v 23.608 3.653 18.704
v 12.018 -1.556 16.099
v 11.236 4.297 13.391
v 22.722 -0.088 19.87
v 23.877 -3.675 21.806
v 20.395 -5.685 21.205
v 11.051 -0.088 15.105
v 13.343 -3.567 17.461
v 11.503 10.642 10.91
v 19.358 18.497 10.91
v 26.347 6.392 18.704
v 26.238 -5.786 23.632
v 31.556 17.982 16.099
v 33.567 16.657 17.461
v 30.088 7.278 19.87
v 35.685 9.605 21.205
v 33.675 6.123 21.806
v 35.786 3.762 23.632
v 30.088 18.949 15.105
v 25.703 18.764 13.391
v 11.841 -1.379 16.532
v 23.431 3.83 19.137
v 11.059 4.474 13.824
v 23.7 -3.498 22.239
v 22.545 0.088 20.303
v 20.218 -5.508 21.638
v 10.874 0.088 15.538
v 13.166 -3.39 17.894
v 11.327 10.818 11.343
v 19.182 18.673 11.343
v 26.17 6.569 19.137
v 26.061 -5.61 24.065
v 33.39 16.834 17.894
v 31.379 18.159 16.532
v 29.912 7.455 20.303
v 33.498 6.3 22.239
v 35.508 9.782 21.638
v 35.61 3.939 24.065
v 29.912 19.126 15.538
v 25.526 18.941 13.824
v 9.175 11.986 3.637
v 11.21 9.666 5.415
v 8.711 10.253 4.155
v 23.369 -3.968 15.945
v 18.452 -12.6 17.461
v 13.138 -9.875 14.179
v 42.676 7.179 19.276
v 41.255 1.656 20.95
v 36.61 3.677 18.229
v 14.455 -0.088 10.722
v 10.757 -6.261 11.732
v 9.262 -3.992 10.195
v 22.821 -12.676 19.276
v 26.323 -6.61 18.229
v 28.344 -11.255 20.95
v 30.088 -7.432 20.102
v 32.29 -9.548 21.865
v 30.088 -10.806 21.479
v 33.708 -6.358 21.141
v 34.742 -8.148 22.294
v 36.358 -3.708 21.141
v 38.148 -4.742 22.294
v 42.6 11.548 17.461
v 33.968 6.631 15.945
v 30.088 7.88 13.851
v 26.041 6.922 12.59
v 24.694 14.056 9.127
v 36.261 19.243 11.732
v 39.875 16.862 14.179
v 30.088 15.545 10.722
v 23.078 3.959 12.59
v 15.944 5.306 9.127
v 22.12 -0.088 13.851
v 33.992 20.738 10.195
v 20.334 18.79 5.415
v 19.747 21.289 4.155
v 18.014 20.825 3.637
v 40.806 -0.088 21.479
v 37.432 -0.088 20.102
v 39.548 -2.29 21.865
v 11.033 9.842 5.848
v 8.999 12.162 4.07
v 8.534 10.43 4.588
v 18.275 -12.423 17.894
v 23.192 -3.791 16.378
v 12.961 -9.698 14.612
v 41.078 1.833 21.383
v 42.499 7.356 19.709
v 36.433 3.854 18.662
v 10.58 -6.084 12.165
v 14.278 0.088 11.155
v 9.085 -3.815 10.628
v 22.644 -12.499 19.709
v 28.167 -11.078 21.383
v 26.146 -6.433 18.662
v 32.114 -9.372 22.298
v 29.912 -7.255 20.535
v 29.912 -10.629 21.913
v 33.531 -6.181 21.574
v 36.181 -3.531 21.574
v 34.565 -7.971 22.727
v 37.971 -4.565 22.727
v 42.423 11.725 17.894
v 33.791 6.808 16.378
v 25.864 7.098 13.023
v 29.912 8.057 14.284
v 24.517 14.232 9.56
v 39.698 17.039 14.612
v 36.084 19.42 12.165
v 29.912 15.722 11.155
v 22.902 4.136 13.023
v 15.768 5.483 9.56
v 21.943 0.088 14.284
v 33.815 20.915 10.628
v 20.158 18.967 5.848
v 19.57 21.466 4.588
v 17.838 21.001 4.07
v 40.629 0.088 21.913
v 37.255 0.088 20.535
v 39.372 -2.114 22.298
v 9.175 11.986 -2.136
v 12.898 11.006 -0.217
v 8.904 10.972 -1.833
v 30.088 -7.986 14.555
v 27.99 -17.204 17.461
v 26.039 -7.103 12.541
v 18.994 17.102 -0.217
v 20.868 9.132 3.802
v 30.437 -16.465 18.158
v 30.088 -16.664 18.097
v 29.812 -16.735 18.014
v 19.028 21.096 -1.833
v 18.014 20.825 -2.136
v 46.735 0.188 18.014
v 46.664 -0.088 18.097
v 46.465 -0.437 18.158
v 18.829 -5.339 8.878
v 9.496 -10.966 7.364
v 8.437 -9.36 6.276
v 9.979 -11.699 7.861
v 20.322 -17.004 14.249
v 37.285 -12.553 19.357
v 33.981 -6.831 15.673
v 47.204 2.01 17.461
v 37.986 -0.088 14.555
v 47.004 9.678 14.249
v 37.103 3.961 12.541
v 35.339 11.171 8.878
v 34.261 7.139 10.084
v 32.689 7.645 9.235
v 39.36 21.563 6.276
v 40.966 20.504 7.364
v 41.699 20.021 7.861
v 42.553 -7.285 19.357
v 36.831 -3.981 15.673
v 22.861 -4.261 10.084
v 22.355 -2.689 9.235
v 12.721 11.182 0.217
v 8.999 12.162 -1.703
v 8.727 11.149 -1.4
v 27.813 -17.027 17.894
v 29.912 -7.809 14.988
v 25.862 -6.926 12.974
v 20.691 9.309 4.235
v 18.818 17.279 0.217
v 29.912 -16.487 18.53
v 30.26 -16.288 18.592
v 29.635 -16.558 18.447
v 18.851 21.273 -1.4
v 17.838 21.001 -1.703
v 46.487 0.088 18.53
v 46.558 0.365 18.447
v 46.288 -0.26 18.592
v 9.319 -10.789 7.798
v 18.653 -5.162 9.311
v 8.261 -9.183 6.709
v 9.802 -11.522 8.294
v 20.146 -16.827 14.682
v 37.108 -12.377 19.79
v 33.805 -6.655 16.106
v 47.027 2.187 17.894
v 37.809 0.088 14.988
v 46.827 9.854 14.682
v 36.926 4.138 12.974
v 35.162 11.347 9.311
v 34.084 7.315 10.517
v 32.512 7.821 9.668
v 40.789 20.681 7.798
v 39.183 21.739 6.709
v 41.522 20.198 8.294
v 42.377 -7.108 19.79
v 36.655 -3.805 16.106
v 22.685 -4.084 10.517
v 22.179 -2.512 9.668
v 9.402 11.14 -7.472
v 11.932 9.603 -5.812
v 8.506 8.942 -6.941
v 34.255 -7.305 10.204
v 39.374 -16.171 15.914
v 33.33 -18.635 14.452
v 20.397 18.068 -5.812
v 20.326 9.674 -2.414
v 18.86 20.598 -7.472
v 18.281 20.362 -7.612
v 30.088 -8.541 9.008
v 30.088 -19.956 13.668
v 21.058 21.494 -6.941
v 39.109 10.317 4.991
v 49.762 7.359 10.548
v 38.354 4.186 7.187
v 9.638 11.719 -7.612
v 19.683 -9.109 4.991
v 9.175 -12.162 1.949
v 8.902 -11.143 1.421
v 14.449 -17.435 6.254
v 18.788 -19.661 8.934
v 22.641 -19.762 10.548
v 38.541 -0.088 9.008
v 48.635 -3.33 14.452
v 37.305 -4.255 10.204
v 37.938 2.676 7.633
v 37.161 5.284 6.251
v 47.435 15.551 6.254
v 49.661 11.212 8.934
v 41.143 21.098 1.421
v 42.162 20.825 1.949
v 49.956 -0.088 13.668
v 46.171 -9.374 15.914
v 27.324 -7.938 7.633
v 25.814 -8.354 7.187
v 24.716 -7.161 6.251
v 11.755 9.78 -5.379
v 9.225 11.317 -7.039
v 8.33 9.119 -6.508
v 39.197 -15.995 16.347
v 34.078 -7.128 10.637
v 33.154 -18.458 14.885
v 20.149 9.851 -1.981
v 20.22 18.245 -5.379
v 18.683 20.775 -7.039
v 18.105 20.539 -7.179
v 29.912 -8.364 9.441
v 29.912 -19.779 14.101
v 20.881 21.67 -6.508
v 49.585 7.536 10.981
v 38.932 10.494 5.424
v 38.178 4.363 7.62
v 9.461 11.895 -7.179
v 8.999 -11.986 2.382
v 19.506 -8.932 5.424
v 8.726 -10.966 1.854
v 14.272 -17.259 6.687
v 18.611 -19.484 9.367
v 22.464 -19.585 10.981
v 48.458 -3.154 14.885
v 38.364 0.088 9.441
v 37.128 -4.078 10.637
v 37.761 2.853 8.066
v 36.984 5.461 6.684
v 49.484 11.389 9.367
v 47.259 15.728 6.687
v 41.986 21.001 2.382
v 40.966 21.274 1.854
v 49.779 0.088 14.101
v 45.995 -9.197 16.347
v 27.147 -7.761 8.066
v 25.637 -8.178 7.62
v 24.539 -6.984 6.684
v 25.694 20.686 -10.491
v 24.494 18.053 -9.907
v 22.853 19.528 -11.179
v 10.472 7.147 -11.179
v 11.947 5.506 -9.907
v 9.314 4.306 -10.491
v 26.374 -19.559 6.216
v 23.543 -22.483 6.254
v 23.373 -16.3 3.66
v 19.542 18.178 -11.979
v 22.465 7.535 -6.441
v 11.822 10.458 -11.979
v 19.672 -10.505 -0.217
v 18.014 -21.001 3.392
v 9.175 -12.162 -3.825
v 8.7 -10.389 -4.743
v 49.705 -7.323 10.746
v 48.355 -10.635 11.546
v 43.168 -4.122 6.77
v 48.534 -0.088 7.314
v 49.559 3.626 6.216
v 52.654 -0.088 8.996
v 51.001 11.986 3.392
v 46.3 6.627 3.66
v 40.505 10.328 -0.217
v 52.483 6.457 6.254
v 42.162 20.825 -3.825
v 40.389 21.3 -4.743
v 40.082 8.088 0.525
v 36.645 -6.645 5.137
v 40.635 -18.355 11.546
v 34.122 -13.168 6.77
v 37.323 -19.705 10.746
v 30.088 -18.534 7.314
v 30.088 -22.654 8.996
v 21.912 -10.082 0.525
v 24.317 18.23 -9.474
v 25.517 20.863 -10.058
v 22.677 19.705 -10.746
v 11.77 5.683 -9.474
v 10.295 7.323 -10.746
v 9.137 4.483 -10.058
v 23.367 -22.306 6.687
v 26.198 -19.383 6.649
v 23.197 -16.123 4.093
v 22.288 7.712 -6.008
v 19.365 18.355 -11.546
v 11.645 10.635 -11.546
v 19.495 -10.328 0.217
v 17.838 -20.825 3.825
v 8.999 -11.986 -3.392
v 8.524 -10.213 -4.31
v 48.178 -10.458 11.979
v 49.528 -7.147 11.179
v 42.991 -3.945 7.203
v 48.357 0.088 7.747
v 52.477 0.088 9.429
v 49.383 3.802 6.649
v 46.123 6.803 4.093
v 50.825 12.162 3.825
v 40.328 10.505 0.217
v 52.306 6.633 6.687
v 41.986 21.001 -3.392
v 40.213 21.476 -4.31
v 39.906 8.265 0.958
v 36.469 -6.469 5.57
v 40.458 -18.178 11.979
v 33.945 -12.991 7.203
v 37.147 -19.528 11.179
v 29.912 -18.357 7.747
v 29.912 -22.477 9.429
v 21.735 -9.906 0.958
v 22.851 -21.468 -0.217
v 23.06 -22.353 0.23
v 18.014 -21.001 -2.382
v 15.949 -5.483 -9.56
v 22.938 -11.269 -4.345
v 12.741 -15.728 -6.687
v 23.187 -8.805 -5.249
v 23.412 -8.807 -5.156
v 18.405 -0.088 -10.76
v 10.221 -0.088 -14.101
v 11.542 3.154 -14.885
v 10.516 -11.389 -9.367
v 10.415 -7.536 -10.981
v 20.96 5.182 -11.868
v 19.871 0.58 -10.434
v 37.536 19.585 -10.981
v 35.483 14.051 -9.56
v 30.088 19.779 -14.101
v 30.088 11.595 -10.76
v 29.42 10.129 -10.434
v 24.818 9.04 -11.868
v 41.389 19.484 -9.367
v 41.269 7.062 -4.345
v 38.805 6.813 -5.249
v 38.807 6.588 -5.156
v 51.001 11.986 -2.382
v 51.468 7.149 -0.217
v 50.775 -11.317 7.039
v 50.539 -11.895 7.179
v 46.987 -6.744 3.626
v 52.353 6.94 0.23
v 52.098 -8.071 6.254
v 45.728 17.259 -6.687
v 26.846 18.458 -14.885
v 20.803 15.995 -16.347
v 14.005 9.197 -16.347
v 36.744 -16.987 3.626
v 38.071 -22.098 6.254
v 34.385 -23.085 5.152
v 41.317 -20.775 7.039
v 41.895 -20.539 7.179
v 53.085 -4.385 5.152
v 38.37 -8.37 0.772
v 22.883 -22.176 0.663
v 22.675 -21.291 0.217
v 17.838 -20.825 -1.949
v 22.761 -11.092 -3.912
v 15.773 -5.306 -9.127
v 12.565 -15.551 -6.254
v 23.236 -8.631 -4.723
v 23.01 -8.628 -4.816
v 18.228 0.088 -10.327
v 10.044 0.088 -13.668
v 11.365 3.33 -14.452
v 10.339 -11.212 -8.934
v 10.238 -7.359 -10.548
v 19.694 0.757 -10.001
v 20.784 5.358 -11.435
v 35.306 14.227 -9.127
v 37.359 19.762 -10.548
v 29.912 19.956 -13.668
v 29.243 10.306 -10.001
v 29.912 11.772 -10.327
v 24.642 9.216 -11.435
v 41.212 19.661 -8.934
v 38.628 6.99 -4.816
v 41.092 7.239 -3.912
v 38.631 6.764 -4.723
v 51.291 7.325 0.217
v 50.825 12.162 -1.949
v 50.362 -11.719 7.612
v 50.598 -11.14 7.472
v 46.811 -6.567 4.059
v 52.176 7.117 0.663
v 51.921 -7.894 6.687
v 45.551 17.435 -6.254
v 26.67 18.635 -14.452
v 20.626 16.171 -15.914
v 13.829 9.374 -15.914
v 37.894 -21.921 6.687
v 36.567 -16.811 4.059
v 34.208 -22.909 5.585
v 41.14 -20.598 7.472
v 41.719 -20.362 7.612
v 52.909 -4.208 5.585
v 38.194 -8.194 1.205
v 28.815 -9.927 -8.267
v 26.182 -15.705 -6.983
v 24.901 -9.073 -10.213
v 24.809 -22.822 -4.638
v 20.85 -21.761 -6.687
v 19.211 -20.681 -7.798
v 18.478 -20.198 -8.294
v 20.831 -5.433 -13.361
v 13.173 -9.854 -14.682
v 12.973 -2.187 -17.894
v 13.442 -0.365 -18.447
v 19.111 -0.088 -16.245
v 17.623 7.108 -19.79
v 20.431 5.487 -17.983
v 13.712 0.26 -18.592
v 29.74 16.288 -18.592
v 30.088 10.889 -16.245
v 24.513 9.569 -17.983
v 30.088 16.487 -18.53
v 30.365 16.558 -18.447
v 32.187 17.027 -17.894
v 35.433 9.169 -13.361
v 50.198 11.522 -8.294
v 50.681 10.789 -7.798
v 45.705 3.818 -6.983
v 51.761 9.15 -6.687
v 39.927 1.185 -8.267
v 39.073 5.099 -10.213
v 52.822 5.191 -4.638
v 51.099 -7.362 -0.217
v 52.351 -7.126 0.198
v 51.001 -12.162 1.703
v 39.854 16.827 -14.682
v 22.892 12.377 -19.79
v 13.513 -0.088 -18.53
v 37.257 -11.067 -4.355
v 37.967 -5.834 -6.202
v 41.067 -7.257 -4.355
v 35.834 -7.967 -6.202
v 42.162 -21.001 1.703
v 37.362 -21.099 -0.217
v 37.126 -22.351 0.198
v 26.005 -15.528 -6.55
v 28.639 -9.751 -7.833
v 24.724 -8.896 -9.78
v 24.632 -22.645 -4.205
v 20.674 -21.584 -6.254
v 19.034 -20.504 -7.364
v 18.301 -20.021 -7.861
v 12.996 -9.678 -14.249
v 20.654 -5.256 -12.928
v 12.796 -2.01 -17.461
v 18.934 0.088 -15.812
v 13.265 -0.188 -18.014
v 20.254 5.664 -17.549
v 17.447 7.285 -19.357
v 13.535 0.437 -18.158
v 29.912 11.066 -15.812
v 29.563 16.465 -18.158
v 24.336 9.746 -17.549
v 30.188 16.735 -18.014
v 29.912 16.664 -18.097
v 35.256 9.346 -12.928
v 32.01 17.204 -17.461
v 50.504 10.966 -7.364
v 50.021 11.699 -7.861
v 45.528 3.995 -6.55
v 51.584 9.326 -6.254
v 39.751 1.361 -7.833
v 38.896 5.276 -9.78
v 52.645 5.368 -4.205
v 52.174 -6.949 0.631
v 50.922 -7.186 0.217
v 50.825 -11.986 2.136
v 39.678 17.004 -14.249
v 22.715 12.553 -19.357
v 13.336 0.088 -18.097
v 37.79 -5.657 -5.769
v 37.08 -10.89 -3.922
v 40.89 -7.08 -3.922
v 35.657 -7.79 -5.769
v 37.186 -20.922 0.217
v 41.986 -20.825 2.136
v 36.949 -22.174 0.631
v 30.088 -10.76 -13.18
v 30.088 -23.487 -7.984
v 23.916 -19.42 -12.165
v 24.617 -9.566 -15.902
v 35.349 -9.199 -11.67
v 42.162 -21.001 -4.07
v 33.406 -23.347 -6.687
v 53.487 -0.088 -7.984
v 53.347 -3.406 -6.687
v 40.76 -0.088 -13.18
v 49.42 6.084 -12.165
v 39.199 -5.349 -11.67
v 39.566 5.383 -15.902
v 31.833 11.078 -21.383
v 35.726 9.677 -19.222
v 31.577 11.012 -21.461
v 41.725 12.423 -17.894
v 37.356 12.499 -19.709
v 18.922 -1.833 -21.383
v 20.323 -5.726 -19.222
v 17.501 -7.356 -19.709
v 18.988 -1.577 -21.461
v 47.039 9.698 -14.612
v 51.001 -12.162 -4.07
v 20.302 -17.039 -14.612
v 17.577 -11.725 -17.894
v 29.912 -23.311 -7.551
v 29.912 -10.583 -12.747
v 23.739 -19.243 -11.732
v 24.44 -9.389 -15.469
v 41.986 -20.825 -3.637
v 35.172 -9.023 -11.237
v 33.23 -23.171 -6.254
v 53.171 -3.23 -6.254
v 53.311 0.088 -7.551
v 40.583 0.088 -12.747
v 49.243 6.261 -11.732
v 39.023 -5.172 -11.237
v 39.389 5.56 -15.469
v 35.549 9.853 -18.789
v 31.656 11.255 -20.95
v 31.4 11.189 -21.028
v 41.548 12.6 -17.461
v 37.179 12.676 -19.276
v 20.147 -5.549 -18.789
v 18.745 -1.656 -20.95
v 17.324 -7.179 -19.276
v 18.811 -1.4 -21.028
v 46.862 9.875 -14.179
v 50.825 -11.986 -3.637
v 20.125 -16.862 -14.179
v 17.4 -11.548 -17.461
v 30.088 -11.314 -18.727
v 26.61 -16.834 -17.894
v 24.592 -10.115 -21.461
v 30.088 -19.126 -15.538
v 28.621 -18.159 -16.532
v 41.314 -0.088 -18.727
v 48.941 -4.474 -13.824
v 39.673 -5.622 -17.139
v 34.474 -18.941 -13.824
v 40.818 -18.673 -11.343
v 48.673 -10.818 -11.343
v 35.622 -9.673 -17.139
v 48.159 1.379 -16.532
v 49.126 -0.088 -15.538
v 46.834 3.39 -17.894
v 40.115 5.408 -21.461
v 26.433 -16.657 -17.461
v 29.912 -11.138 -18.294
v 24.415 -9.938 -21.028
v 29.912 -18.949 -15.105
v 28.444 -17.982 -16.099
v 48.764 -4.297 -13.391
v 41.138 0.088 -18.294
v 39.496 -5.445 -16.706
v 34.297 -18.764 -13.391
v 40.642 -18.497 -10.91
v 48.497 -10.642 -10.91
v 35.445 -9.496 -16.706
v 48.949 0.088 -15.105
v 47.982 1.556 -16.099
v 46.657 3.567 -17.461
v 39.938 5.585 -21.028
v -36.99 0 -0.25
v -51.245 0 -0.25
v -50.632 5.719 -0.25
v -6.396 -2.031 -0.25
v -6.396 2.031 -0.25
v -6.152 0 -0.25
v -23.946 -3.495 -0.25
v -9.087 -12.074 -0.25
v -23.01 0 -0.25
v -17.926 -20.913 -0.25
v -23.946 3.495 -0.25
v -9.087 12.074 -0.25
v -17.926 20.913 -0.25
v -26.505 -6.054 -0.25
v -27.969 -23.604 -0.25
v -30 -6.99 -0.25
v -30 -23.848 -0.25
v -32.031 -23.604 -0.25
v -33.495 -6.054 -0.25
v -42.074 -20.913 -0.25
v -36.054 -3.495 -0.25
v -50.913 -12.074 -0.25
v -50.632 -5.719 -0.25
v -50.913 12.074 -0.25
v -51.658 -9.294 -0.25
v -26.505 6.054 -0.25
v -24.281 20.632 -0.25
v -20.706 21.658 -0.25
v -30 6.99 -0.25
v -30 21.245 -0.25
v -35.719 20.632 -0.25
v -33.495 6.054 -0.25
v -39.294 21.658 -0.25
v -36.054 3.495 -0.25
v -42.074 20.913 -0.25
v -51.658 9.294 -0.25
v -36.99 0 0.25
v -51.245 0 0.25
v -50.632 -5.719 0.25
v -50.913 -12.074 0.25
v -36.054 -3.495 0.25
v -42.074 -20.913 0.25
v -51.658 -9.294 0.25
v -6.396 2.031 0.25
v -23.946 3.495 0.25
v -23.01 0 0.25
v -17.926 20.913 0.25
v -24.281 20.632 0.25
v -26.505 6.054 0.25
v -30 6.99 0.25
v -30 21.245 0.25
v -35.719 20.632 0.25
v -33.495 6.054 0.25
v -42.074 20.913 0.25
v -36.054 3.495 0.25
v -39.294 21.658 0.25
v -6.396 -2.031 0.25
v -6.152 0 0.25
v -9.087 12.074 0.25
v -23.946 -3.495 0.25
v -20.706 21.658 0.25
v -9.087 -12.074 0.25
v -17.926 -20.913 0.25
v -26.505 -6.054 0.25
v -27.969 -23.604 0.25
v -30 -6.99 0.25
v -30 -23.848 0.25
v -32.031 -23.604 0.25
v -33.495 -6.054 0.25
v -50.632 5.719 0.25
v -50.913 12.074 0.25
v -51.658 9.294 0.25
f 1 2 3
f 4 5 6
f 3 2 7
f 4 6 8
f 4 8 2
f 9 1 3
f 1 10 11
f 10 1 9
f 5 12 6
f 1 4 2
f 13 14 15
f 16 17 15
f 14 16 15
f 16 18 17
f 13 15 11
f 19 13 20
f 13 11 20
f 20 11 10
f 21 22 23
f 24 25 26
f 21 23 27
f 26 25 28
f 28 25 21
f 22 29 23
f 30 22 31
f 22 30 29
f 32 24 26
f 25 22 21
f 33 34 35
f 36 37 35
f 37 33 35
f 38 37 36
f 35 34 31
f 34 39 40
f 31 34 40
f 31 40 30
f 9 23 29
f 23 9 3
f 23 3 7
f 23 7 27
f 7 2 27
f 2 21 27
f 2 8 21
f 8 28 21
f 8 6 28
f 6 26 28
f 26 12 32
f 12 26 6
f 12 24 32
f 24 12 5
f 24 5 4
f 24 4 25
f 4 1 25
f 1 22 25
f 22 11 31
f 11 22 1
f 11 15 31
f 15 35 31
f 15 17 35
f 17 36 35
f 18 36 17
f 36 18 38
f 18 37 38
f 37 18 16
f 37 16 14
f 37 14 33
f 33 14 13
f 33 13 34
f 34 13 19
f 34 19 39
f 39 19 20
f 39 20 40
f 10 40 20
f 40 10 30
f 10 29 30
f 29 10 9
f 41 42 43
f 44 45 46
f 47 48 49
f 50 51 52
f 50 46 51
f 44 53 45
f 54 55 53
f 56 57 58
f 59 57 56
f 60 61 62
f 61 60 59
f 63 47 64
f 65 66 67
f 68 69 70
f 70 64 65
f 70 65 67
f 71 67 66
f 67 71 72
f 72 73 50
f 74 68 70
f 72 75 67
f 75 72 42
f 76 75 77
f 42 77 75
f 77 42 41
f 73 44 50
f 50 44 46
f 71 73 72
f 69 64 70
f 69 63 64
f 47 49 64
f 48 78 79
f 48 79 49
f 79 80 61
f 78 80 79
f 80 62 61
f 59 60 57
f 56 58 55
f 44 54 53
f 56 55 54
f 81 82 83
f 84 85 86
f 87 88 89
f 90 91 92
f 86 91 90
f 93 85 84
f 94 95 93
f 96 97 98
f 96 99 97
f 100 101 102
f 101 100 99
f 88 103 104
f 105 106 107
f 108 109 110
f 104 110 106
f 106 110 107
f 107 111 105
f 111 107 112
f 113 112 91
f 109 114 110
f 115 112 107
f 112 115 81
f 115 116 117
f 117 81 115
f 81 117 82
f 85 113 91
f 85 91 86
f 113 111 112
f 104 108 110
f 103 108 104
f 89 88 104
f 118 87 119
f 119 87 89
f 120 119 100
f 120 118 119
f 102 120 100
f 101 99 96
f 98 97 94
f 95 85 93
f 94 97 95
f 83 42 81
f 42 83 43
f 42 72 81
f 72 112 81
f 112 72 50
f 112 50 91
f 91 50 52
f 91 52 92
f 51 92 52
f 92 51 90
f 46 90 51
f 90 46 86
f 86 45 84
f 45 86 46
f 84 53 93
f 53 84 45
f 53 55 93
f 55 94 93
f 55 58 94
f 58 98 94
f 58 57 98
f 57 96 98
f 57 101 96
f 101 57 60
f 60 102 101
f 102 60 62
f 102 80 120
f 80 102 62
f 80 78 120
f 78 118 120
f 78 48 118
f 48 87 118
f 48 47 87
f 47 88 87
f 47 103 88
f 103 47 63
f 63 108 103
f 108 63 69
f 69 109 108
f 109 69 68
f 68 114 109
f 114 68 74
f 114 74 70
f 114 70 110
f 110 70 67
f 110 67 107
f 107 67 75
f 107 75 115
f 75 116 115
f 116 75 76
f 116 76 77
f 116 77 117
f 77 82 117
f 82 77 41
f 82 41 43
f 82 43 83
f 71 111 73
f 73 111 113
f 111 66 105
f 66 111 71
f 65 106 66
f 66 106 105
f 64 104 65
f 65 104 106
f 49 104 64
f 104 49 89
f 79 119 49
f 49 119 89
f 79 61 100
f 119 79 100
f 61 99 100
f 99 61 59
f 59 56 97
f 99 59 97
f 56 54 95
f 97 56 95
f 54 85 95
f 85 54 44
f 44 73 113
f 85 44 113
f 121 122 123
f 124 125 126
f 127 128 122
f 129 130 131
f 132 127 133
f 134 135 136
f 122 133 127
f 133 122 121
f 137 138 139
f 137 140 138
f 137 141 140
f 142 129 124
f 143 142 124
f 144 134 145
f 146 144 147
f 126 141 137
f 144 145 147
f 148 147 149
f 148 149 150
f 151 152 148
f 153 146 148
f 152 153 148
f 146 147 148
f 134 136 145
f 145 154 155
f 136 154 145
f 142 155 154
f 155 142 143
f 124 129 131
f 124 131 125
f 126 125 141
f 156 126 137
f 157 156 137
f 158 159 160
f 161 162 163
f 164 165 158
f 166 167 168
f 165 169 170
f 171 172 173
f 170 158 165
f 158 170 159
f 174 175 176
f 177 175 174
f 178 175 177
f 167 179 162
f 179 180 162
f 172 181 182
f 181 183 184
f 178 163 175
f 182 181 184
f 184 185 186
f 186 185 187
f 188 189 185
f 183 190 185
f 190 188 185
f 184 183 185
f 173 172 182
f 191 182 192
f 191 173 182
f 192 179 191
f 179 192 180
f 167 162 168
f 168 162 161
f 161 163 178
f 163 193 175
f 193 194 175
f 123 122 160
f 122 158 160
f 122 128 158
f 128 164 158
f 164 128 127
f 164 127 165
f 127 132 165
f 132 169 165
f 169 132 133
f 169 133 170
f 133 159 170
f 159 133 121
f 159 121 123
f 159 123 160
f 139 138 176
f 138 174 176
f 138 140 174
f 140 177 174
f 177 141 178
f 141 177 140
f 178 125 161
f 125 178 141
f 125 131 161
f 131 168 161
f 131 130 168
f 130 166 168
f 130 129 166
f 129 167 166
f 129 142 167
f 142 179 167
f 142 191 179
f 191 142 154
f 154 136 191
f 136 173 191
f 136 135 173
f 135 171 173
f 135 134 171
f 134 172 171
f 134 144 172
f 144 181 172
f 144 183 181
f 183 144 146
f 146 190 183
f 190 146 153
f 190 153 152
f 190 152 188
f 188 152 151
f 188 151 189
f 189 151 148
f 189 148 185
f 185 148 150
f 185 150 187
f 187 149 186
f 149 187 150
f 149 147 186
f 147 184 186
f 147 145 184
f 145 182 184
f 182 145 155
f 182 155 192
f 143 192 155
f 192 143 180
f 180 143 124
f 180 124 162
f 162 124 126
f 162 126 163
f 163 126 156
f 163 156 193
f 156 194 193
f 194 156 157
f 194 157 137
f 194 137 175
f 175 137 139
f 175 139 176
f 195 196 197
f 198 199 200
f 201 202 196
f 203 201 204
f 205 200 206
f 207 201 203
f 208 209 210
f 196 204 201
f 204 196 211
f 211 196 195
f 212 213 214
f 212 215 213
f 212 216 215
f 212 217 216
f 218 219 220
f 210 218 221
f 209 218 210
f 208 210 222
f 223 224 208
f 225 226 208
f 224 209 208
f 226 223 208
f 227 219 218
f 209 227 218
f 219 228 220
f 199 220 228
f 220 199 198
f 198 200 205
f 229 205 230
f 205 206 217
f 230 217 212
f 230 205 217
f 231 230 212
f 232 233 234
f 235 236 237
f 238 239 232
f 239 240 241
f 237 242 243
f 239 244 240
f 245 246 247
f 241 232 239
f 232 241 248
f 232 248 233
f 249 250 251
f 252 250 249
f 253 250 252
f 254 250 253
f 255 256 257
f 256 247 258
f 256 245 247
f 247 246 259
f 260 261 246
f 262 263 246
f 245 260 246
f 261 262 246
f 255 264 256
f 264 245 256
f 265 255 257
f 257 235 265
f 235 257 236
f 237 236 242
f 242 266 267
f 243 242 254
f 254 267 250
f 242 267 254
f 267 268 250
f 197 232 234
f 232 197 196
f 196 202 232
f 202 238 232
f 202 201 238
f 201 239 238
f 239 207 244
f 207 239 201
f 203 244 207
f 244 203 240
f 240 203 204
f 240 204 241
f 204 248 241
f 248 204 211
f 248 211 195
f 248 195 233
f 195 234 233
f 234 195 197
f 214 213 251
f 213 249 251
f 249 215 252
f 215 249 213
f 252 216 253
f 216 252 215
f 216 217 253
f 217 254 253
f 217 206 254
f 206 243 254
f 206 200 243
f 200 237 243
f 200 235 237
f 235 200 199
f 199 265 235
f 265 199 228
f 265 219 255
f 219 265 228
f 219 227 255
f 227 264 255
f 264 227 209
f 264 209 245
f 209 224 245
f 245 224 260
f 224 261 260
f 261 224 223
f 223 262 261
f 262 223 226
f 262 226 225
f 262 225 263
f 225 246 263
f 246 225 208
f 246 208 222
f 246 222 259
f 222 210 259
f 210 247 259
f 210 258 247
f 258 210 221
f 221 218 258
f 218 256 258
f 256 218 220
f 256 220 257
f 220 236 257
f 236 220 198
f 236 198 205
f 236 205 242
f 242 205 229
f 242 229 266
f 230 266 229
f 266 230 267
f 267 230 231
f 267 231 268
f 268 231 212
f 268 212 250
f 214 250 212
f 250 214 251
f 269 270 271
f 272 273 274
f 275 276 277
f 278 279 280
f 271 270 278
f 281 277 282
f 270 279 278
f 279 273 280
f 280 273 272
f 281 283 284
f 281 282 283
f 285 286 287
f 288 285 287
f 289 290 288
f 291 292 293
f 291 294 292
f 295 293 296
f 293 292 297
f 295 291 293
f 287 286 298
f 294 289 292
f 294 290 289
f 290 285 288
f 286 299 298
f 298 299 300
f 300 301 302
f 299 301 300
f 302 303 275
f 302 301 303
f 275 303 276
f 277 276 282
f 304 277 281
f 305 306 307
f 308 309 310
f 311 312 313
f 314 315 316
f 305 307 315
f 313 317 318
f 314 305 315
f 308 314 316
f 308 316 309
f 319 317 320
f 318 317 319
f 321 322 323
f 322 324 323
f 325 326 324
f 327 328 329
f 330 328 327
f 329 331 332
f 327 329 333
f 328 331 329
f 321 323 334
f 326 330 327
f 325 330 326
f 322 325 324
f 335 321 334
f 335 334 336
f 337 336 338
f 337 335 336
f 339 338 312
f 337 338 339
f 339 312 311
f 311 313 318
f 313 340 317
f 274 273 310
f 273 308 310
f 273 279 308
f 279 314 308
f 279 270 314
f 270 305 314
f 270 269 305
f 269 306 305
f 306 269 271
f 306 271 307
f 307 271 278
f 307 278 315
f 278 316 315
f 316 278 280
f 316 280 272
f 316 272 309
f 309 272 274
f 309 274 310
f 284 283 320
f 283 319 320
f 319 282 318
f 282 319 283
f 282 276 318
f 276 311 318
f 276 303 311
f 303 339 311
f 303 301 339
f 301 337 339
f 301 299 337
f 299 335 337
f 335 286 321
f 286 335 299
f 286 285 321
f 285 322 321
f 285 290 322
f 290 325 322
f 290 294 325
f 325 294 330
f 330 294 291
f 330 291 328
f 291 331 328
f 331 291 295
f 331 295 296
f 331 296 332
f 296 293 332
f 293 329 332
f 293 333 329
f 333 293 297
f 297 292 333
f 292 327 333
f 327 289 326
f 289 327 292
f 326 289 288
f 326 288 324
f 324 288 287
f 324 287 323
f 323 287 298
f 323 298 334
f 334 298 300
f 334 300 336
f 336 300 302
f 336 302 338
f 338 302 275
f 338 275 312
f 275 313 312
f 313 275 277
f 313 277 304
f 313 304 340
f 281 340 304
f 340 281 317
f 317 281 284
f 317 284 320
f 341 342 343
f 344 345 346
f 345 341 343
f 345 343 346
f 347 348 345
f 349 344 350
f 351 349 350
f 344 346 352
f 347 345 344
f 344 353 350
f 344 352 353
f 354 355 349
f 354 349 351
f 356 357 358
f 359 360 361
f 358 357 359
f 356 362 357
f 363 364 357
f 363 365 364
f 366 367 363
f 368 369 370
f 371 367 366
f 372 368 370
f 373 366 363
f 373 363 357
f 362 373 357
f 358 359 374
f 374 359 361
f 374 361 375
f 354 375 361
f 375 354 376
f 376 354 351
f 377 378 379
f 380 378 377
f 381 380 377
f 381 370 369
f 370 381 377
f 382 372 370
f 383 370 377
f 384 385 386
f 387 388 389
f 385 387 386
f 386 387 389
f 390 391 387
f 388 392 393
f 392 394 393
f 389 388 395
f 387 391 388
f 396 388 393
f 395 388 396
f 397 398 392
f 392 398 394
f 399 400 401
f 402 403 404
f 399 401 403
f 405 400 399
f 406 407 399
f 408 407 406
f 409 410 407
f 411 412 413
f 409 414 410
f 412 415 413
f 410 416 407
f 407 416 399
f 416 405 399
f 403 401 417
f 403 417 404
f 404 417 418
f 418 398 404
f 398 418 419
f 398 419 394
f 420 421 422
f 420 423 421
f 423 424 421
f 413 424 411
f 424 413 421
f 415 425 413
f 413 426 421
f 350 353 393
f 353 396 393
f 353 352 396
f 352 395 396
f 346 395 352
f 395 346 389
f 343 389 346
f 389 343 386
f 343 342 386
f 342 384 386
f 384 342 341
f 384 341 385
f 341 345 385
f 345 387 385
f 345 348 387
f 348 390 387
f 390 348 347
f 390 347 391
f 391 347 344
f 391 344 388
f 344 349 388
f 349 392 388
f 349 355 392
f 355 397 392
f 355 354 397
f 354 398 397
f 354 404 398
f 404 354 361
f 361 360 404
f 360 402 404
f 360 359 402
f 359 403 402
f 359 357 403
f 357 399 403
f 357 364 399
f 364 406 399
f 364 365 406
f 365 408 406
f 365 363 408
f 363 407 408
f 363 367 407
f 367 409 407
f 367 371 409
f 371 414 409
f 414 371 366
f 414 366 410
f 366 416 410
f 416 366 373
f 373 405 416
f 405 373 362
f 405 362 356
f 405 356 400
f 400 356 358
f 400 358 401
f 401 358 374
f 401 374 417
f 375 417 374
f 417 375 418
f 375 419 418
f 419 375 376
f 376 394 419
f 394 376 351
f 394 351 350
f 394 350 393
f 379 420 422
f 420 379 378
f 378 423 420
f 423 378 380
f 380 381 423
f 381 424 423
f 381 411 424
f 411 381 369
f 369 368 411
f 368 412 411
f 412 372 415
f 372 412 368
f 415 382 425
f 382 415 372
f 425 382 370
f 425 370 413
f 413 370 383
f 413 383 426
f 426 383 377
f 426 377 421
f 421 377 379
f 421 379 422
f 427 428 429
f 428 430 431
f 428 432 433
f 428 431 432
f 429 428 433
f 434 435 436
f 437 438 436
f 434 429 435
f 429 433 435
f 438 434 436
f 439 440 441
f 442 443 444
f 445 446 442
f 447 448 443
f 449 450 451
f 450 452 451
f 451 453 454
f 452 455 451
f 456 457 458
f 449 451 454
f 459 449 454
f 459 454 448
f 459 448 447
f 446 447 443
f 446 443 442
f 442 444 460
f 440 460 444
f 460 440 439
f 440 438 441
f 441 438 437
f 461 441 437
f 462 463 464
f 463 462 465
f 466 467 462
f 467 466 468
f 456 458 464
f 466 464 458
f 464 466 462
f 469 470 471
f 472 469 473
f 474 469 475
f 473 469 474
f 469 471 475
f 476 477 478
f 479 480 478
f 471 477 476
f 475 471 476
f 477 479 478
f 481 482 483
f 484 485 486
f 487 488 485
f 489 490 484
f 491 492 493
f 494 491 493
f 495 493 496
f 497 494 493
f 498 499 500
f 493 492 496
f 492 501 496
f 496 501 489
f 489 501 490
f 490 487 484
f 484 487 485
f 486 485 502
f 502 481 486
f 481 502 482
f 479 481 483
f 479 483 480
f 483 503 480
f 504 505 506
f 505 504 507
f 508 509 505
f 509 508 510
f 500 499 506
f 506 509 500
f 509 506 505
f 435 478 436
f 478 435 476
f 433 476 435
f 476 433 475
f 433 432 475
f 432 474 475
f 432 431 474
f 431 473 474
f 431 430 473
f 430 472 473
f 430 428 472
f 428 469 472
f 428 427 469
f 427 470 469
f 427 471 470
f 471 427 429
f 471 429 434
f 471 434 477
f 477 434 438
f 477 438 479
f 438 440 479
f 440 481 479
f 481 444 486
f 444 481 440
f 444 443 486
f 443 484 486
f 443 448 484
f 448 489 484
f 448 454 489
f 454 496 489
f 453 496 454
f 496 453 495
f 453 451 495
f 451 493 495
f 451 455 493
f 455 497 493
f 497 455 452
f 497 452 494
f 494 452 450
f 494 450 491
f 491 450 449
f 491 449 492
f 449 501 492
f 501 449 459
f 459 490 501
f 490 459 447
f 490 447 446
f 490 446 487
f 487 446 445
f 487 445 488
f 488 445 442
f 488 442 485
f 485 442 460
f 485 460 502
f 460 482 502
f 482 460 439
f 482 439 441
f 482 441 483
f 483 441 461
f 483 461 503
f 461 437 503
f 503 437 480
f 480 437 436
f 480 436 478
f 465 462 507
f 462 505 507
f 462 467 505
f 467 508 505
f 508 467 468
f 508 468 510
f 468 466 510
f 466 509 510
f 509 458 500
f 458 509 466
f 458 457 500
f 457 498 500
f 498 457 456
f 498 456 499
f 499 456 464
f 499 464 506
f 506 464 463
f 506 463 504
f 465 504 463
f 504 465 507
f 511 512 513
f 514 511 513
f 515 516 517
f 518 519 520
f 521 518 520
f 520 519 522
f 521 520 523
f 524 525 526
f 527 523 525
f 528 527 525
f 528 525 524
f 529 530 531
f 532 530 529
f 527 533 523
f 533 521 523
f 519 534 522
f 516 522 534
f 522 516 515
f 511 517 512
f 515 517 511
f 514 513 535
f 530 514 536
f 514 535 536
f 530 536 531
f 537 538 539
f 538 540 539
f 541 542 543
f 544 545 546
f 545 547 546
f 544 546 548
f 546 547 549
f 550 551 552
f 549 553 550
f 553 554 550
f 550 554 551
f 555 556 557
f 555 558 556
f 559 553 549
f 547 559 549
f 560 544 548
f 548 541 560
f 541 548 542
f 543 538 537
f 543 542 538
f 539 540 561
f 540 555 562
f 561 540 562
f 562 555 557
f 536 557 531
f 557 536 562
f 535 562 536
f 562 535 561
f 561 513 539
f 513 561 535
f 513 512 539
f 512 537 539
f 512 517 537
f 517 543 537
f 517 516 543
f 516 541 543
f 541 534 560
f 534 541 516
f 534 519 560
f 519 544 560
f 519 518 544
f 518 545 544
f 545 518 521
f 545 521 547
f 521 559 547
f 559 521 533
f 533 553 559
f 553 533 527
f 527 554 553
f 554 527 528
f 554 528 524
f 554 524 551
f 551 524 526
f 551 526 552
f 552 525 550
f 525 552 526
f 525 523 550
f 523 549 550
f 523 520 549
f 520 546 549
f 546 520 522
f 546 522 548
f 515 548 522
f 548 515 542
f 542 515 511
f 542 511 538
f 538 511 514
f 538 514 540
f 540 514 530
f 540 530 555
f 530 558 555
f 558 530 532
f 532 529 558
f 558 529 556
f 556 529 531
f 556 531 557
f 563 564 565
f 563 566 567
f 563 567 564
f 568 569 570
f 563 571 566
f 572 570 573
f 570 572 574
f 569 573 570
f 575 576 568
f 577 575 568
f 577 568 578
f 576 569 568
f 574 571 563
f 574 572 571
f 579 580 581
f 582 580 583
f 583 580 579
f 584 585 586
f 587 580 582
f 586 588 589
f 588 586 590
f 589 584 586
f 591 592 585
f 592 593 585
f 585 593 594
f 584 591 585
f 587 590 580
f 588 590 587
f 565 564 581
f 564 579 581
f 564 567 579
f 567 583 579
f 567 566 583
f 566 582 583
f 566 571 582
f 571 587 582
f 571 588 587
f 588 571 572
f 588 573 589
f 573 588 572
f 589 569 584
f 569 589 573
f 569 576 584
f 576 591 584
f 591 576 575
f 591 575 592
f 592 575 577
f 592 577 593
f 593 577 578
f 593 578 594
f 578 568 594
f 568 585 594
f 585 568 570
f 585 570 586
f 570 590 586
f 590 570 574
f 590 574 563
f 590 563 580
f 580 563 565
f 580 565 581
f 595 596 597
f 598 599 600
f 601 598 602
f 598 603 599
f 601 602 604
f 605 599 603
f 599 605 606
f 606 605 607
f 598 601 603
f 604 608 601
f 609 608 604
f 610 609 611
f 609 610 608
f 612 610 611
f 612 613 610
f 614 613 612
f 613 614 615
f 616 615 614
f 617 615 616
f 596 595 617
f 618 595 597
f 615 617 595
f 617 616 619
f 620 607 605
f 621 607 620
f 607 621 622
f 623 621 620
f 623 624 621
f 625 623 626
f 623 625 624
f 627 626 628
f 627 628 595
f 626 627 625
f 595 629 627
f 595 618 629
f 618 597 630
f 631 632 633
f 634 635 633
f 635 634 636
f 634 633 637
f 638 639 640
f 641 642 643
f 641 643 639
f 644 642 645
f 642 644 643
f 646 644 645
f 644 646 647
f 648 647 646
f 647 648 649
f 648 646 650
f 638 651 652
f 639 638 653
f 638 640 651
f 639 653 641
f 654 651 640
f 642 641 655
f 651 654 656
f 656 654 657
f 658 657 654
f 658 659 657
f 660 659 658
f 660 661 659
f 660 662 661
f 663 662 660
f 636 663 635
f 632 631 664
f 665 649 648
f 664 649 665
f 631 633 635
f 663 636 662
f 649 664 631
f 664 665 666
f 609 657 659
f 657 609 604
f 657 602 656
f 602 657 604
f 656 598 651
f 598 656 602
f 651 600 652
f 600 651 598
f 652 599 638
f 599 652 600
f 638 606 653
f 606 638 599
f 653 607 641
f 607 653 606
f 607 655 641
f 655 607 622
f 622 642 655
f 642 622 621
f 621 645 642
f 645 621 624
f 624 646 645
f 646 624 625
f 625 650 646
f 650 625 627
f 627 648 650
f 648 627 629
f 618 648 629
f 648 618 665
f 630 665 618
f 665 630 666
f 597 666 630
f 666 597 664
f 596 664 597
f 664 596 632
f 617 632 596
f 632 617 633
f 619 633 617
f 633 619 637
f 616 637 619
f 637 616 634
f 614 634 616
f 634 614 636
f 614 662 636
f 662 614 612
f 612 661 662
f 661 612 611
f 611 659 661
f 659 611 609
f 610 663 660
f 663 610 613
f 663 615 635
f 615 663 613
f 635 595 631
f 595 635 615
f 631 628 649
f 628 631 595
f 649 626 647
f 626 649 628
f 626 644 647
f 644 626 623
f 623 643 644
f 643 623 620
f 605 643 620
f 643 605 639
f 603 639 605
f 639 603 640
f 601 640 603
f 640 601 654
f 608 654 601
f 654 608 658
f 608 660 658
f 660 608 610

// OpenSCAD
module thing()
{
	$fa = 30;
	difference() {
		sphere(r = 25);
		cylinder(h = 62.5, r1 = 12.5, r2 = 6.25, center = true);
		rotate(90, [ 1, 0, 0 ]) cylinder(h = 62.5,
				r1 = 12.5, r2 = 6.25, center = true);
		rotate(90, [ 0, 1, 0 ]) cylinder(h = 62.5,
				r1 = 12.5, r2 = 6.25, center = true);
	}
}

module demo_proj()
{
	linear_extrude(center = true, height = 0.5) projection(cut = false) thing();
	% thing();
}

module demo_cut()
{
	for (i=[-20:5:+20]) {
		 rotate(-30, [ 1, 1, 0 ]) translate([ 0, 0, -i ])
			linear_extrude(center = true, height = 0.5) projection(cut = true)
				translate([ 0, 0, i ]) rotate(+30, [ 1, 1, 0 ]) thing();
	}
	% thing();
}

echo(version=version());
translate([ -30, 0, 0 ]) demo_proj();
translate([ +30, 0, 0 ]) demo_cut();

// Written by Clifford Wolf <clifford@clifford.at> and Marius
// Kintel <marius@kintel.net>
//
// To the extent possible under law, the author(s) have dedicated all
// copyright and related and neighboring rights to this software to the
// public domain worldwide. This software is distributed without any
// warranty.
//
// You should have received a copy of the CC0 Public Domain
// Dedication along with this software.
// If not, see <http://creativecommons.org/publicdomain/zero/1.0/>.
